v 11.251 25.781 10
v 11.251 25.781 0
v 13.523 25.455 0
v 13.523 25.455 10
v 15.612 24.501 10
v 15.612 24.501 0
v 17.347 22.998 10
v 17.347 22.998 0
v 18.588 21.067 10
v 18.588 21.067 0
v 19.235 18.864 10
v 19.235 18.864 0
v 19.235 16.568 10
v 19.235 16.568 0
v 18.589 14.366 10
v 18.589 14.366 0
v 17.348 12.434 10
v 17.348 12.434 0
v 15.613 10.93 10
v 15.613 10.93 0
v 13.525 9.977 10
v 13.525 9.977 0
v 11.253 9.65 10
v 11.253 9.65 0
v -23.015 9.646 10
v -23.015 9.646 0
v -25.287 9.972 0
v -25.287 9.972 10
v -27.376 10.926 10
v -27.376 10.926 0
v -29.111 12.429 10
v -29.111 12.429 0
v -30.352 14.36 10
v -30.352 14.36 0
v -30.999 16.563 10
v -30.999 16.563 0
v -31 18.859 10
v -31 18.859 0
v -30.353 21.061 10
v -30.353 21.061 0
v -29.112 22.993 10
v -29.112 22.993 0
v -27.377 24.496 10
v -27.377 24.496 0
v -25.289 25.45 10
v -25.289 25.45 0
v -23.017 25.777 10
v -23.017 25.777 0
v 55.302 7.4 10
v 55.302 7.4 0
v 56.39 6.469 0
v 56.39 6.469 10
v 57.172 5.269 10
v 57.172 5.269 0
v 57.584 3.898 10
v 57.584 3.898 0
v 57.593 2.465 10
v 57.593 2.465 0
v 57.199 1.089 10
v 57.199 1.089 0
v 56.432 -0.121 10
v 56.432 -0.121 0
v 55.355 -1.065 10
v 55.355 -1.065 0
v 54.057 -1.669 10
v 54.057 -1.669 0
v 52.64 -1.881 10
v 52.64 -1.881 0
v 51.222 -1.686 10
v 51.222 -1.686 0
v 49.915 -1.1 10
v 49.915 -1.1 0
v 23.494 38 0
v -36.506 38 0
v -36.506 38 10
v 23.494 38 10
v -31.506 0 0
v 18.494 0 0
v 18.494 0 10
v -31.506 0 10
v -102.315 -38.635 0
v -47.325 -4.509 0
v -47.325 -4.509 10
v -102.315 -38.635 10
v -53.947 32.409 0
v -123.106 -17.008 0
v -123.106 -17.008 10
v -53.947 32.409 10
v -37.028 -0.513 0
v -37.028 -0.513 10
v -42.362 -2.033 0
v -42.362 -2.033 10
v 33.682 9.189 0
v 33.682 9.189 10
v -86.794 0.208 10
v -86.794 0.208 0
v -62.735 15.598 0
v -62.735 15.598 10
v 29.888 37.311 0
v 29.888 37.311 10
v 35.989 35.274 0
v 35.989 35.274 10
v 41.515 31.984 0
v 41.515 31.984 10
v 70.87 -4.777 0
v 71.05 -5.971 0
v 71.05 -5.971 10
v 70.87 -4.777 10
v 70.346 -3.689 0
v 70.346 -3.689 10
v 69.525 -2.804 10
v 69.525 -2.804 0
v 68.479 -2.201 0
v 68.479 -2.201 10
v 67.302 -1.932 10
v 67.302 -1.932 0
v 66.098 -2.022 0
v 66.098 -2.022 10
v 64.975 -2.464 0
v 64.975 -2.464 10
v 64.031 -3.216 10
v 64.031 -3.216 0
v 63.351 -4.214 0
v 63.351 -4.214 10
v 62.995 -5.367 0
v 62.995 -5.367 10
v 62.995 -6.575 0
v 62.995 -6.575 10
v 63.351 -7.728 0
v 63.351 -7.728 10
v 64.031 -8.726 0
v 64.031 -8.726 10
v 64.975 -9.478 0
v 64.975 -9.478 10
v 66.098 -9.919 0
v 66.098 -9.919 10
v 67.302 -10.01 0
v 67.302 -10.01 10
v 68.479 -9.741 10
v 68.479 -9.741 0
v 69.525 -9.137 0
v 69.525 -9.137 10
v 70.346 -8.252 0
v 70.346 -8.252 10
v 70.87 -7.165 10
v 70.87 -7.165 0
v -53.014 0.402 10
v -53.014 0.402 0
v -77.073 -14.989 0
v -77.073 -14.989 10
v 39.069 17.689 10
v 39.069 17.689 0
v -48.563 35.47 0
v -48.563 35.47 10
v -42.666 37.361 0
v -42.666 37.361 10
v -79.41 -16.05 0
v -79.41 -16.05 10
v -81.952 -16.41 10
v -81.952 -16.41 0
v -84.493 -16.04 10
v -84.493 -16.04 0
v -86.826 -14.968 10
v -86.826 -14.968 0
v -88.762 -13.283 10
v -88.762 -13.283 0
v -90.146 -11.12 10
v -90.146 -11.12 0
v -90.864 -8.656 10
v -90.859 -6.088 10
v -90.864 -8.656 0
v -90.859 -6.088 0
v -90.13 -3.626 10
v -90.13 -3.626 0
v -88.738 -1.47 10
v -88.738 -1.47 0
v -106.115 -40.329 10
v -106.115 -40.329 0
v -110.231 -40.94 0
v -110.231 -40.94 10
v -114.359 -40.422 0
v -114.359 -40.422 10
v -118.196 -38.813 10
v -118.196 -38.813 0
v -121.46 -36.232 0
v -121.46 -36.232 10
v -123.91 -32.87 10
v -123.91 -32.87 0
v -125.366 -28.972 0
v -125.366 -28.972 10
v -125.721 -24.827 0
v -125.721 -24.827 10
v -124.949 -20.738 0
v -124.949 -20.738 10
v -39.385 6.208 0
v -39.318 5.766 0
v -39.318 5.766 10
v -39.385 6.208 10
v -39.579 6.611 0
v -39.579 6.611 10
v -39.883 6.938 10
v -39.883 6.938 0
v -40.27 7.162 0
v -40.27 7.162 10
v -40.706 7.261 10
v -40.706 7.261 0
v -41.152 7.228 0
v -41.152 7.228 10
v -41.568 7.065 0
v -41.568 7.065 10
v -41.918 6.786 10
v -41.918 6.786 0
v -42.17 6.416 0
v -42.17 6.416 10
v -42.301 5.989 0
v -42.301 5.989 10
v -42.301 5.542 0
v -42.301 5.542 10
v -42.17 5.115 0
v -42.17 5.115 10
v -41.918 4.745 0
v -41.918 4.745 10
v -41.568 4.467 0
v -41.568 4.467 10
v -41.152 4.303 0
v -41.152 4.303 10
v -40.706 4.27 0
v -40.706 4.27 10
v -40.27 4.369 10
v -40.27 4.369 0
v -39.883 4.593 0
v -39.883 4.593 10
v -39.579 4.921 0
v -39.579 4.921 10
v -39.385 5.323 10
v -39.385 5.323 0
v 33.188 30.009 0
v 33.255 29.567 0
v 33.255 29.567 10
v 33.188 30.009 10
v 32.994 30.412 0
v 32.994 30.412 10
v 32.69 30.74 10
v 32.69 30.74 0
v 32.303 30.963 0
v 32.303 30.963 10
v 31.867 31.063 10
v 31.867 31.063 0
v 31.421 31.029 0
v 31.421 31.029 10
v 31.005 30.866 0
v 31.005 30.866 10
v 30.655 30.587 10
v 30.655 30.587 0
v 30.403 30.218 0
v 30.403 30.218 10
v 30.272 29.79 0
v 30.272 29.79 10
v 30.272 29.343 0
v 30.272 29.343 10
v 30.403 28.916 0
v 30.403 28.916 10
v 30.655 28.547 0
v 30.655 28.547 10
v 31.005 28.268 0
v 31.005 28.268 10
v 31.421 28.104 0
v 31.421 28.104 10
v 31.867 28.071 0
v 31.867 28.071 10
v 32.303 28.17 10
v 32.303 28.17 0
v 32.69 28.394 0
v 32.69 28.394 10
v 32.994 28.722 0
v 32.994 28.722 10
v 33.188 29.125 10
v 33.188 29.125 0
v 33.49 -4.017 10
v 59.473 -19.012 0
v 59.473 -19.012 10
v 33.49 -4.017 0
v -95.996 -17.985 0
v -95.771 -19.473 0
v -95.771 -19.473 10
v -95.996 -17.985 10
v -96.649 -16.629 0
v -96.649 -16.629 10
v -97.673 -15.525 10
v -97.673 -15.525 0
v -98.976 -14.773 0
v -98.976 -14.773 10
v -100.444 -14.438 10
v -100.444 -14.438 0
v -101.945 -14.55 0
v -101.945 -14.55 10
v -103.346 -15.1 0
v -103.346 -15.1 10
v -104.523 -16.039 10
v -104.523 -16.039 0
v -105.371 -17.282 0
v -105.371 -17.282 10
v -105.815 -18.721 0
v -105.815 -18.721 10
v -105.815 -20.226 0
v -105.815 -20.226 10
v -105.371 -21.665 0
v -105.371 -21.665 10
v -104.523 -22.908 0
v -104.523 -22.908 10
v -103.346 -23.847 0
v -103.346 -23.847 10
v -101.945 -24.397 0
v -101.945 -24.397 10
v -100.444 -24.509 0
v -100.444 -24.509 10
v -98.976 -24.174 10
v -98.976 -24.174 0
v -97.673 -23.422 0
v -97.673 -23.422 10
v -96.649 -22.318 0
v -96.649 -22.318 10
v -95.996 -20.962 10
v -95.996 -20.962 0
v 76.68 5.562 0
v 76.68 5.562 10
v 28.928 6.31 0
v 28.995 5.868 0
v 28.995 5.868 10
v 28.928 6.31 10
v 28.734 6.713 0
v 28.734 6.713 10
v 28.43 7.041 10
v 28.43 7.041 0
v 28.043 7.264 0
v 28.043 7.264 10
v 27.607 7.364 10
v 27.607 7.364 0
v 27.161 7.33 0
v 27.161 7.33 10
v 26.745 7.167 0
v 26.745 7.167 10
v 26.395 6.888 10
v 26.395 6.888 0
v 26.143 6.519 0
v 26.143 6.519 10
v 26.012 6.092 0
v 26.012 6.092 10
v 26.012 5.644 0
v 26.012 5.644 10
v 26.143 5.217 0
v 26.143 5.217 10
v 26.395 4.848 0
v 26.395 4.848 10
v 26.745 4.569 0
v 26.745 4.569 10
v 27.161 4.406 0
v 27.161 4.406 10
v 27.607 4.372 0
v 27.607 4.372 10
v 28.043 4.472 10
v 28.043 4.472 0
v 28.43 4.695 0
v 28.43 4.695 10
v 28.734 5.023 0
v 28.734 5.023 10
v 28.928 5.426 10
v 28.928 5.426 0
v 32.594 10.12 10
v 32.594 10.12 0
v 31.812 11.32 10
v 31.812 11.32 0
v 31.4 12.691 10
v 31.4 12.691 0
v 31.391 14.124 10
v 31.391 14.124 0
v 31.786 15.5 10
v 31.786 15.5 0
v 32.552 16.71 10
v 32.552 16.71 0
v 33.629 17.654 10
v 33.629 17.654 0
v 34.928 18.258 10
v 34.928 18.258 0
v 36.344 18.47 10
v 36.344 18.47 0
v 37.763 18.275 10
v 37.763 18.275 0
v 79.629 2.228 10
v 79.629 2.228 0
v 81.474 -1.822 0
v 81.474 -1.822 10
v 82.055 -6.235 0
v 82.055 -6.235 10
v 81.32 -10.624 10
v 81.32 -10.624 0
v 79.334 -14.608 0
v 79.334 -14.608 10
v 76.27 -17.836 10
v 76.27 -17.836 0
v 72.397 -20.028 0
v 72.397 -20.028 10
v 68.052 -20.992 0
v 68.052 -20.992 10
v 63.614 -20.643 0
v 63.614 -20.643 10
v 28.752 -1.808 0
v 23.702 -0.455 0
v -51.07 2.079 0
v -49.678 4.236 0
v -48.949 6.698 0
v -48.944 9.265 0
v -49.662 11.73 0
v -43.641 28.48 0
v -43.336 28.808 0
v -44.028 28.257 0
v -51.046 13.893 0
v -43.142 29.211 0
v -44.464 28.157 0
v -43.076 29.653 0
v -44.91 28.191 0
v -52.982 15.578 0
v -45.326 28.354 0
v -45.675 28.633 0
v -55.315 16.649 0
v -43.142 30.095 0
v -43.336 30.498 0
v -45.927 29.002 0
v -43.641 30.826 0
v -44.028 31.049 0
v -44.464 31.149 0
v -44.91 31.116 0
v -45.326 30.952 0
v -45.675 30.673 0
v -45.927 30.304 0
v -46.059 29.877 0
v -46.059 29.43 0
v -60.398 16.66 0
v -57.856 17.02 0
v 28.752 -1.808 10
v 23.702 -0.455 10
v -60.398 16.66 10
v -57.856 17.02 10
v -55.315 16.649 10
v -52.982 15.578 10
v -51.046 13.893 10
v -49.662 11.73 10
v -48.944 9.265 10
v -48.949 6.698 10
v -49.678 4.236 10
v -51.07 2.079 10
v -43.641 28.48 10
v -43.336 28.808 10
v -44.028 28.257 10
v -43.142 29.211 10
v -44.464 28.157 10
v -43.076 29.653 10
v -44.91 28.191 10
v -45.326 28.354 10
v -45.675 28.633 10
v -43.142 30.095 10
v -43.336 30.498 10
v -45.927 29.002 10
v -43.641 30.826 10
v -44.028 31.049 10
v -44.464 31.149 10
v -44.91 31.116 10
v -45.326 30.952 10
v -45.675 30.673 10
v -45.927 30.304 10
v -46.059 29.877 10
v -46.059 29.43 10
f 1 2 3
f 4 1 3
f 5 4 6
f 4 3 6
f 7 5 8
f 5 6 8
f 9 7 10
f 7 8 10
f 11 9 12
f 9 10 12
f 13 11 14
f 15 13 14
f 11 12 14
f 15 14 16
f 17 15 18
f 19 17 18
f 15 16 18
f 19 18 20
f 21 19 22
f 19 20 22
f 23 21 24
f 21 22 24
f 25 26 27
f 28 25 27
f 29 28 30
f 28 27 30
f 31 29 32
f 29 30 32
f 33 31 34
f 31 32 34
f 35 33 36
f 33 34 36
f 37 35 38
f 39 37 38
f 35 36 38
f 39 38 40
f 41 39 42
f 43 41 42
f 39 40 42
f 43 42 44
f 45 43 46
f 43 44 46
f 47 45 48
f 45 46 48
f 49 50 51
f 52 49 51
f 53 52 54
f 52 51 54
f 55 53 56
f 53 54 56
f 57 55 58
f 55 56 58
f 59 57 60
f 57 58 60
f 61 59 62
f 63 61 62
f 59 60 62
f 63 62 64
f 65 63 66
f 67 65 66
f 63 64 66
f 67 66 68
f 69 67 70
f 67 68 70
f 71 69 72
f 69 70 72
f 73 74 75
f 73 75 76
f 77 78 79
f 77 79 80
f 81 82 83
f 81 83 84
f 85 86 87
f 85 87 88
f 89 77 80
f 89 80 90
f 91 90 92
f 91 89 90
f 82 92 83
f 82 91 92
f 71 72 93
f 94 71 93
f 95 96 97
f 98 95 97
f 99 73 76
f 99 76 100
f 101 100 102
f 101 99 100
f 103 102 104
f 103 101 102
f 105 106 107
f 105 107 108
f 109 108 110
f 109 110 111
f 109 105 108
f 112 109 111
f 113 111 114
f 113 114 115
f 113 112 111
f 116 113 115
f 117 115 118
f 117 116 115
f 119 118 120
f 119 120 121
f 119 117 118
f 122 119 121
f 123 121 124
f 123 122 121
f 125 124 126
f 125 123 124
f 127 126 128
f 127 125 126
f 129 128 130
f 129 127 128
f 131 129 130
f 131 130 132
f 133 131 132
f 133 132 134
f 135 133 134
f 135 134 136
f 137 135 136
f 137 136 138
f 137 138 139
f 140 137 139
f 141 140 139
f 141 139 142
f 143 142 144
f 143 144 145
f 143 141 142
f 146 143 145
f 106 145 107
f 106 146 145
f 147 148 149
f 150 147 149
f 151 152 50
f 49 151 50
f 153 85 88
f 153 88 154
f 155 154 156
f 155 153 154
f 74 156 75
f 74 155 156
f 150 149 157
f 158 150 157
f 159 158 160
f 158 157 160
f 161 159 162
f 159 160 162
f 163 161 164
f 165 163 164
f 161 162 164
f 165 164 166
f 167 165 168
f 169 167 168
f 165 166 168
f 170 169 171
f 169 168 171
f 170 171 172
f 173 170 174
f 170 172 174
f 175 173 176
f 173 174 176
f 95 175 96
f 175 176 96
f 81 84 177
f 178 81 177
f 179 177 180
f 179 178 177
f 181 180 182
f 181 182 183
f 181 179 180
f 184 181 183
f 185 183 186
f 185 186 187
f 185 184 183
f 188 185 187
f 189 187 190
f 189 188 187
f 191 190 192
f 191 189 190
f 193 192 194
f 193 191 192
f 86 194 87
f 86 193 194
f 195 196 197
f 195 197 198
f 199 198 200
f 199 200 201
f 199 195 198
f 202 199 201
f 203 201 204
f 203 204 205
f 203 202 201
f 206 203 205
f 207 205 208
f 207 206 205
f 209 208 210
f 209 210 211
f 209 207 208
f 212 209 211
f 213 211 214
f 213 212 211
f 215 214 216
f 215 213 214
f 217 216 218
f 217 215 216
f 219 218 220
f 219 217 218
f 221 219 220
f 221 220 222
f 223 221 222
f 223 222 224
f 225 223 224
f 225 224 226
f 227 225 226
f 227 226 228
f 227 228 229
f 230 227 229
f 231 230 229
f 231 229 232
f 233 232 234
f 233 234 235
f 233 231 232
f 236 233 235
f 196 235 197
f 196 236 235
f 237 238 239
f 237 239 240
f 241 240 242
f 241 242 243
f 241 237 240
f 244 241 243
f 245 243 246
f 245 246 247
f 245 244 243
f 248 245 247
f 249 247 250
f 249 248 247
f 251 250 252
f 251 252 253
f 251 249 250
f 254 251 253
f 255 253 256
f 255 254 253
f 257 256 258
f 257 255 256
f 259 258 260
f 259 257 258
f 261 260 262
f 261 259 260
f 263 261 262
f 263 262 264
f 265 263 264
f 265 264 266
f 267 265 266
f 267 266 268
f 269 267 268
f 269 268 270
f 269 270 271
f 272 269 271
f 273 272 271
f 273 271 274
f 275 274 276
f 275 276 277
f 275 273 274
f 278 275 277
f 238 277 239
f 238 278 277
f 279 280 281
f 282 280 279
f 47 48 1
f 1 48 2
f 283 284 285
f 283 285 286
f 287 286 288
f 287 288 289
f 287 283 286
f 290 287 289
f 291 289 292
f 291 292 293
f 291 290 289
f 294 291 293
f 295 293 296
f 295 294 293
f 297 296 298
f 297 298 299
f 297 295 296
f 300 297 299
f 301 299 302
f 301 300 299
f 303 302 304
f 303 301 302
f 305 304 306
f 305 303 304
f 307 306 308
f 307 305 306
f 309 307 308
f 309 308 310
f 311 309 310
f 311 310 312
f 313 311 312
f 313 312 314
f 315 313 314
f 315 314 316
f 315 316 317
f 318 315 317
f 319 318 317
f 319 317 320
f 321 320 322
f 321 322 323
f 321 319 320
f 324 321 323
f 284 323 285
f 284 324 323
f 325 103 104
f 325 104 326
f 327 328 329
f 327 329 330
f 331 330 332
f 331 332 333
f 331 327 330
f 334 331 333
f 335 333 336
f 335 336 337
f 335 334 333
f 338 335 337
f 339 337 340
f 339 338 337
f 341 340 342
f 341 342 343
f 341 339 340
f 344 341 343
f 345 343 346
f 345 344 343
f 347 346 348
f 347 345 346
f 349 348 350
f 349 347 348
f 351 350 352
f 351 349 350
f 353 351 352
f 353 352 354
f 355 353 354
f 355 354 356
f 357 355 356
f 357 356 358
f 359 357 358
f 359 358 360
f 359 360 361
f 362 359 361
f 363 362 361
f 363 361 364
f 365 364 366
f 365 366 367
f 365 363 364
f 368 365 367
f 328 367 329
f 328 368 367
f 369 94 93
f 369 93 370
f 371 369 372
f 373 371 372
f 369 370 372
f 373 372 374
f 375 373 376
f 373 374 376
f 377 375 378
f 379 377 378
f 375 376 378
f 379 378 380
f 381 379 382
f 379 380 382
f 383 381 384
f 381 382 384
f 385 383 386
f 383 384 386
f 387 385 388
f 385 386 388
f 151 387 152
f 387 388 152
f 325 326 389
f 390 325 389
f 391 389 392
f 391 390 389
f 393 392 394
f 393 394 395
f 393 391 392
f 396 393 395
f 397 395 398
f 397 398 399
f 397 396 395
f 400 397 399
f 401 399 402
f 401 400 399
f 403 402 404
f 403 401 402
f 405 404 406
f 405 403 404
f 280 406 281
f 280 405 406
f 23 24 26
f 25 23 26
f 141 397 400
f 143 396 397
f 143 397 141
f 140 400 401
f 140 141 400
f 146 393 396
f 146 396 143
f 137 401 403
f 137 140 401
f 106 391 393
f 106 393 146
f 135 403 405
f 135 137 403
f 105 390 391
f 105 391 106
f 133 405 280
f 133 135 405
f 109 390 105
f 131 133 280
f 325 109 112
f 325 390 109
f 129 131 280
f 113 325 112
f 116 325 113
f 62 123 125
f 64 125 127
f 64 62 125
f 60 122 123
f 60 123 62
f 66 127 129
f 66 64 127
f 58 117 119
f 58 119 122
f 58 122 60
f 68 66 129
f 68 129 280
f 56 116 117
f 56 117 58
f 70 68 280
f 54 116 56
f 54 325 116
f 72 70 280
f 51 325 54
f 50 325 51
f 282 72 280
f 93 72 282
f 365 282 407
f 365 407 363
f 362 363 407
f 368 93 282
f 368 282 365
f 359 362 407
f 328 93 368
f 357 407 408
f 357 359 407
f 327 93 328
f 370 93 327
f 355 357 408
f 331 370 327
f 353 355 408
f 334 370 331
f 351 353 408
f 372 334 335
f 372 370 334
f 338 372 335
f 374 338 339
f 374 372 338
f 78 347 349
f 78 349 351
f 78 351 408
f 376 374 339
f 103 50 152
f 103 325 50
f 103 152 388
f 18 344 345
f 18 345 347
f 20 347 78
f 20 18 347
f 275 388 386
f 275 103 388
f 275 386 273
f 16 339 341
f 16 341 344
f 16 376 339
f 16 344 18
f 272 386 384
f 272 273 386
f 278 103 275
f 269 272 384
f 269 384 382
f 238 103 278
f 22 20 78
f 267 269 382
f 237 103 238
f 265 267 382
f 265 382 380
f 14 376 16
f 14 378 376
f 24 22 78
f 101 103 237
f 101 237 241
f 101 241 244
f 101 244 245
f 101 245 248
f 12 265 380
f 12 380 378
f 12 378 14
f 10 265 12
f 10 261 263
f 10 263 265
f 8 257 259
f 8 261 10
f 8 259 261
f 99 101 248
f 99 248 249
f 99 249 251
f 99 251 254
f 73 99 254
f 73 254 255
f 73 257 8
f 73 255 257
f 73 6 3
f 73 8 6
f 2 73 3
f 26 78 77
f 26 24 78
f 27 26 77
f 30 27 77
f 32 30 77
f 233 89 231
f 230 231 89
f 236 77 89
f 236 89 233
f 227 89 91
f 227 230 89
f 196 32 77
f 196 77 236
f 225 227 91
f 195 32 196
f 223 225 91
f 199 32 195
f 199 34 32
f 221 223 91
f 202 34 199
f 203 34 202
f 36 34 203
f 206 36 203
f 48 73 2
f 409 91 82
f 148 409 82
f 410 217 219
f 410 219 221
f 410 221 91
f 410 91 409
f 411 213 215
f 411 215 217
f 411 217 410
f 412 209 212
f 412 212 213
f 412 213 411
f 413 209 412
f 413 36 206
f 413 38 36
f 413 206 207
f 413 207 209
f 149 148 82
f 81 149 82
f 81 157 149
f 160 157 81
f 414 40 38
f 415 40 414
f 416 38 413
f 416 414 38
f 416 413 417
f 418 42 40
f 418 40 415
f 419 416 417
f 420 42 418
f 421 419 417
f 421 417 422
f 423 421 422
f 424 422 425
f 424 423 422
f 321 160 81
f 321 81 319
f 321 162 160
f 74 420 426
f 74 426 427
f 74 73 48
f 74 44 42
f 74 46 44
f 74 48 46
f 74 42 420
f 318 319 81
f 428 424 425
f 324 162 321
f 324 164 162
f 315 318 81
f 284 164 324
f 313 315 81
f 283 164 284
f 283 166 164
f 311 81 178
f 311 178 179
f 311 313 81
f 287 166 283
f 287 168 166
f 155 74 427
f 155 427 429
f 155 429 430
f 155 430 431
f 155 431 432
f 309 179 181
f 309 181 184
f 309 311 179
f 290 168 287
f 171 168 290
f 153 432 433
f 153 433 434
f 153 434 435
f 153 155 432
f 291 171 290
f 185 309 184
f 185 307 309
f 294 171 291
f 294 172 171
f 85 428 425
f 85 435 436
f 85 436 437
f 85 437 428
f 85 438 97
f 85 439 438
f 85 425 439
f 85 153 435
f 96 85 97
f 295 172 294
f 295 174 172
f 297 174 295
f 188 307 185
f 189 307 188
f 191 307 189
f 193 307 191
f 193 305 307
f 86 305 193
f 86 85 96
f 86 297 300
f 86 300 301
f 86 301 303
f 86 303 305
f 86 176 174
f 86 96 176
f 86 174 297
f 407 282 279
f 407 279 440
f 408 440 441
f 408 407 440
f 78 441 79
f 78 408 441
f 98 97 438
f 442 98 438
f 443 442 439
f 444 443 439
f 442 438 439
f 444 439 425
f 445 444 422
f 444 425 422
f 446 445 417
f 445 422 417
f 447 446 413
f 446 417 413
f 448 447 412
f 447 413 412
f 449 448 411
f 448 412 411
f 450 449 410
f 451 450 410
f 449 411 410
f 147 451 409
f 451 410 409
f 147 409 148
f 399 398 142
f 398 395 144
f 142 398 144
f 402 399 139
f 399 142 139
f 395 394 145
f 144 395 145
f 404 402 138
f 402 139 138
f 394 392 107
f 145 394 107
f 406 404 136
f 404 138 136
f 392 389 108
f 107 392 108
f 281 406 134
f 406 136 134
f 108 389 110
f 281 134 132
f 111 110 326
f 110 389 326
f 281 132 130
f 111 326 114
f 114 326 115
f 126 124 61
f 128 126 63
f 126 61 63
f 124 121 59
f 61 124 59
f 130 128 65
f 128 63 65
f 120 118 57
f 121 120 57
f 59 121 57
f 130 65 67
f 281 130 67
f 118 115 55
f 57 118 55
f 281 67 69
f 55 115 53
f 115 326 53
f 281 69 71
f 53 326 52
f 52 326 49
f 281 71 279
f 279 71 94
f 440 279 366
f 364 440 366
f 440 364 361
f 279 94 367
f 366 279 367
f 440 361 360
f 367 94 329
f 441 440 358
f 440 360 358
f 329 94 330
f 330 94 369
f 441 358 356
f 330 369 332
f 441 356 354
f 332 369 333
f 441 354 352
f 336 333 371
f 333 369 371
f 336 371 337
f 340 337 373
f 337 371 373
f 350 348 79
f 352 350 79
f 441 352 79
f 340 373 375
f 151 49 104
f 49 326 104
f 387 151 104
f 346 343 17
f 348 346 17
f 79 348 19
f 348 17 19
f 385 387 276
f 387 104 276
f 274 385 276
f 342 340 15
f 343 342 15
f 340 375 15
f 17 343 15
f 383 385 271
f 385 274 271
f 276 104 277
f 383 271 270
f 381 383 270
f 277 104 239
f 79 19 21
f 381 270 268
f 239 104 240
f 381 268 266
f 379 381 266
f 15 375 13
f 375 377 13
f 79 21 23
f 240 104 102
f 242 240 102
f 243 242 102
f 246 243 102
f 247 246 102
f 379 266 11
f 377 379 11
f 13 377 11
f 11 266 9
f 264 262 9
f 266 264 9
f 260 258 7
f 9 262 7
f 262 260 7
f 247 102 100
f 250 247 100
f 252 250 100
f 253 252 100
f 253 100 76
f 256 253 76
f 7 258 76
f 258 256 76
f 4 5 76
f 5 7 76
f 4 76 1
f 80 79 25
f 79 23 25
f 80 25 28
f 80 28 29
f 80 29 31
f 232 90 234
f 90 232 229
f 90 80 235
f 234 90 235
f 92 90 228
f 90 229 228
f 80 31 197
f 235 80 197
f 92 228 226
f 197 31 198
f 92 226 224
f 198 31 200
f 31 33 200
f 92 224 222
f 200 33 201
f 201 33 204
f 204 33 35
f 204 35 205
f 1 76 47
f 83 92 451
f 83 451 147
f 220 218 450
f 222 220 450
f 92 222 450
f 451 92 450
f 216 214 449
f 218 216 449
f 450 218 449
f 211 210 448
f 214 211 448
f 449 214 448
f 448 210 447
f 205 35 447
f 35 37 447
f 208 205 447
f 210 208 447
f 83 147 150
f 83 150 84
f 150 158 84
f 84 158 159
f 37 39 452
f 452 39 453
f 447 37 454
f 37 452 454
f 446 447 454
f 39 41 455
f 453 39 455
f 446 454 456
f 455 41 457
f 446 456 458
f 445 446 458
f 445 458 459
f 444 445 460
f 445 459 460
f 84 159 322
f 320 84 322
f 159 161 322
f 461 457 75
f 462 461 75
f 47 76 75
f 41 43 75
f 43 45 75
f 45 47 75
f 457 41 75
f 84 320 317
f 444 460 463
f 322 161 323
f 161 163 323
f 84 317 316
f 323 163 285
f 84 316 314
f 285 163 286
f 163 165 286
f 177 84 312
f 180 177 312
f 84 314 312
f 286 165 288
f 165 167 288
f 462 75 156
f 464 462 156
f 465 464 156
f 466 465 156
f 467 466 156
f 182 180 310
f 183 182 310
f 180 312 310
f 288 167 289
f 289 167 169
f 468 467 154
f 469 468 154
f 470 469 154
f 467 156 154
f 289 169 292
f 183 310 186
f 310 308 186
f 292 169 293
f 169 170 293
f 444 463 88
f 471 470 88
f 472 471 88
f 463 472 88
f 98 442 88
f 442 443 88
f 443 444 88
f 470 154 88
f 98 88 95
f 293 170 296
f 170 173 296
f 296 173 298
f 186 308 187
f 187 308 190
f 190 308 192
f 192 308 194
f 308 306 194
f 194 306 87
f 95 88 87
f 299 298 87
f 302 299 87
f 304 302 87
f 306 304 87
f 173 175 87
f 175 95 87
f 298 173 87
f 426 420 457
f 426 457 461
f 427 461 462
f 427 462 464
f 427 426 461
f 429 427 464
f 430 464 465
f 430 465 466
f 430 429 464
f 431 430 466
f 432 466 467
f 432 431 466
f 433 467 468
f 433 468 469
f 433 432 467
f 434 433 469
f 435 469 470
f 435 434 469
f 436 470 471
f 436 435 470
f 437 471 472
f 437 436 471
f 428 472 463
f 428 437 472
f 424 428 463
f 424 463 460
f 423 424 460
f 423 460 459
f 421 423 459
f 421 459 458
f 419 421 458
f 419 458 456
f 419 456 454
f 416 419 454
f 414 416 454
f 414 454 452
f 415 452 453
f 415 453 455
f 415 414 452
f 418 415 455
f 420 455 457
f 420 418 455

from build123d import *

# Parameters (mm, degrees)
SKETCH1_R           = 4.05
SKETCH1_R_2         = 1.5
SKETCH1_R_3         = 5.05
BOSS_EXTRUDE1_DEPTH = 10


with BuildPart() as part:
    # Sketch1 → Boss-Extrude1 (new body)
    with BuildSketch(Plane.XY):
        with BuildLine():
            Line((-36.50585994, 38), (23.49414006, 38))
            ThreePointArc((23.49414006, 38), (32.993428927, 36.45634395), (41.515142146, 31.984234067))
            Line((41.515142146, 31.984234067), (76.680353084, 5.562196244))
            ThreePointArc((76.680353084, 5.562196244), (79.334029485, -14.607546806), (59.473059994, -19.012365084))
            Line((59.473059994, -19.012365084), (33.489782569, -4.016722575))
            ThreePointArc((33.489782569, -4.016722575), (26.256281428, -1.021574208), (18.49414006, 0))
            Line((18.49414006, 0), (-31.50585994, 0))
            ThreePointArc((-31.50585994, 0), (-39.73032204, -1.149380887), (-47.324581503, -4.509451788))
            Line((-47.324581503, -4.509451788), (-102.315148598, -38.635060317))
            ThreePointArc((-102.315148598, -38.635060317), (-121.459805376, -36.232350563), (-123.106127076, -17.0078734))
            Line((-123.106127076, -17.0078734), (-53.947129798, 32.409057863))
            ThreePointArc((-53.947129798, 32.409057863), (-45.663596127, 36.56809178), (-36.50585994, 38))
        make_face()
        with Locations((66.99963225, -5.970908883)):
            Circle(SKETCH1_R, mode=Mode.SUBTRACT)
        with Locations((-44.575814379, 29.653127509)):
            Circle(SKETCH1_R_2, mode=Mode.SUBTRACT)
        with Locations((-40.818103787, 5.765583384)):
            Circle(SKETCH1_R_2, mode=Mode.SUBTRACT)
        with Locations((31.754938755, 29.566776323)):
            Circle(SKETCH1_R_2, mode=Mode.SUBTRACT)
        with Locations((27.4947716, 5.867993419)):
            Circle(SKETCH1_R_2, mode=Mode.SUBTRACT)
        with Locations((-100.821311964, -19.473430923)):
            Circle(SKETCH1_R_3, mode=Mode.SUBTRACT)
        with BuildLine():
            Line((-86.793889829, 0.207662569), (-62.735326509, 15.598189533))
            ThreePointArc((-62.735326509, 15.598189533), (-50.276491752, 12.860645223), (-53.014036062, 0.401810467))
            Line((-53.014036062, 0.401810467), (-77.072599382, -14.988716497))
            ThreePointArc((-77.072599382, -14.988716497), (-89.531434139, -12.251172188), (-86.793889829, 0.207662569))
        make_face(mode=Mode.SUBTRACT)
        with BuildLine():
            Line((-23.016668441, 25.777290149), (11.250740888, 25.781094638))
            ThreePointArc((11.250740888, 25.781094638), (19.317386003, 17.716240499), (11.252531864, 9.649595384))
            Line((11.252531864, 9.649595384), (-23.014877464, 9.645790894))
            ThreePointArc((-23.014877464, 9.645790894), (-31.08152258, 17.710645033), (-23.016668441, 25.777290149))
        make_face(mode=Mode.SUBTRACT)
        with BuildLine():
            Line((39.069043687, 17.688629392), (55.302205937, 7.399981644))
            ThreePointArc((55.302205937, 7.399981644), (56.858473261, 0.45660111), (49.915092727, -1.099666214))
            Line((49.915092727, -1.099666214), (33.681930477, 9.188981534))
            ThreePointArc((33.681930477, 9.188981534), (32.125663153, 16.132362067), (39.069043687, 17.688629392))
        make_face(mode=Mode.SUBTRACT)
    extrude(amount=BOSS_EXTRUDE1_DEPTH)


solid = part.part
